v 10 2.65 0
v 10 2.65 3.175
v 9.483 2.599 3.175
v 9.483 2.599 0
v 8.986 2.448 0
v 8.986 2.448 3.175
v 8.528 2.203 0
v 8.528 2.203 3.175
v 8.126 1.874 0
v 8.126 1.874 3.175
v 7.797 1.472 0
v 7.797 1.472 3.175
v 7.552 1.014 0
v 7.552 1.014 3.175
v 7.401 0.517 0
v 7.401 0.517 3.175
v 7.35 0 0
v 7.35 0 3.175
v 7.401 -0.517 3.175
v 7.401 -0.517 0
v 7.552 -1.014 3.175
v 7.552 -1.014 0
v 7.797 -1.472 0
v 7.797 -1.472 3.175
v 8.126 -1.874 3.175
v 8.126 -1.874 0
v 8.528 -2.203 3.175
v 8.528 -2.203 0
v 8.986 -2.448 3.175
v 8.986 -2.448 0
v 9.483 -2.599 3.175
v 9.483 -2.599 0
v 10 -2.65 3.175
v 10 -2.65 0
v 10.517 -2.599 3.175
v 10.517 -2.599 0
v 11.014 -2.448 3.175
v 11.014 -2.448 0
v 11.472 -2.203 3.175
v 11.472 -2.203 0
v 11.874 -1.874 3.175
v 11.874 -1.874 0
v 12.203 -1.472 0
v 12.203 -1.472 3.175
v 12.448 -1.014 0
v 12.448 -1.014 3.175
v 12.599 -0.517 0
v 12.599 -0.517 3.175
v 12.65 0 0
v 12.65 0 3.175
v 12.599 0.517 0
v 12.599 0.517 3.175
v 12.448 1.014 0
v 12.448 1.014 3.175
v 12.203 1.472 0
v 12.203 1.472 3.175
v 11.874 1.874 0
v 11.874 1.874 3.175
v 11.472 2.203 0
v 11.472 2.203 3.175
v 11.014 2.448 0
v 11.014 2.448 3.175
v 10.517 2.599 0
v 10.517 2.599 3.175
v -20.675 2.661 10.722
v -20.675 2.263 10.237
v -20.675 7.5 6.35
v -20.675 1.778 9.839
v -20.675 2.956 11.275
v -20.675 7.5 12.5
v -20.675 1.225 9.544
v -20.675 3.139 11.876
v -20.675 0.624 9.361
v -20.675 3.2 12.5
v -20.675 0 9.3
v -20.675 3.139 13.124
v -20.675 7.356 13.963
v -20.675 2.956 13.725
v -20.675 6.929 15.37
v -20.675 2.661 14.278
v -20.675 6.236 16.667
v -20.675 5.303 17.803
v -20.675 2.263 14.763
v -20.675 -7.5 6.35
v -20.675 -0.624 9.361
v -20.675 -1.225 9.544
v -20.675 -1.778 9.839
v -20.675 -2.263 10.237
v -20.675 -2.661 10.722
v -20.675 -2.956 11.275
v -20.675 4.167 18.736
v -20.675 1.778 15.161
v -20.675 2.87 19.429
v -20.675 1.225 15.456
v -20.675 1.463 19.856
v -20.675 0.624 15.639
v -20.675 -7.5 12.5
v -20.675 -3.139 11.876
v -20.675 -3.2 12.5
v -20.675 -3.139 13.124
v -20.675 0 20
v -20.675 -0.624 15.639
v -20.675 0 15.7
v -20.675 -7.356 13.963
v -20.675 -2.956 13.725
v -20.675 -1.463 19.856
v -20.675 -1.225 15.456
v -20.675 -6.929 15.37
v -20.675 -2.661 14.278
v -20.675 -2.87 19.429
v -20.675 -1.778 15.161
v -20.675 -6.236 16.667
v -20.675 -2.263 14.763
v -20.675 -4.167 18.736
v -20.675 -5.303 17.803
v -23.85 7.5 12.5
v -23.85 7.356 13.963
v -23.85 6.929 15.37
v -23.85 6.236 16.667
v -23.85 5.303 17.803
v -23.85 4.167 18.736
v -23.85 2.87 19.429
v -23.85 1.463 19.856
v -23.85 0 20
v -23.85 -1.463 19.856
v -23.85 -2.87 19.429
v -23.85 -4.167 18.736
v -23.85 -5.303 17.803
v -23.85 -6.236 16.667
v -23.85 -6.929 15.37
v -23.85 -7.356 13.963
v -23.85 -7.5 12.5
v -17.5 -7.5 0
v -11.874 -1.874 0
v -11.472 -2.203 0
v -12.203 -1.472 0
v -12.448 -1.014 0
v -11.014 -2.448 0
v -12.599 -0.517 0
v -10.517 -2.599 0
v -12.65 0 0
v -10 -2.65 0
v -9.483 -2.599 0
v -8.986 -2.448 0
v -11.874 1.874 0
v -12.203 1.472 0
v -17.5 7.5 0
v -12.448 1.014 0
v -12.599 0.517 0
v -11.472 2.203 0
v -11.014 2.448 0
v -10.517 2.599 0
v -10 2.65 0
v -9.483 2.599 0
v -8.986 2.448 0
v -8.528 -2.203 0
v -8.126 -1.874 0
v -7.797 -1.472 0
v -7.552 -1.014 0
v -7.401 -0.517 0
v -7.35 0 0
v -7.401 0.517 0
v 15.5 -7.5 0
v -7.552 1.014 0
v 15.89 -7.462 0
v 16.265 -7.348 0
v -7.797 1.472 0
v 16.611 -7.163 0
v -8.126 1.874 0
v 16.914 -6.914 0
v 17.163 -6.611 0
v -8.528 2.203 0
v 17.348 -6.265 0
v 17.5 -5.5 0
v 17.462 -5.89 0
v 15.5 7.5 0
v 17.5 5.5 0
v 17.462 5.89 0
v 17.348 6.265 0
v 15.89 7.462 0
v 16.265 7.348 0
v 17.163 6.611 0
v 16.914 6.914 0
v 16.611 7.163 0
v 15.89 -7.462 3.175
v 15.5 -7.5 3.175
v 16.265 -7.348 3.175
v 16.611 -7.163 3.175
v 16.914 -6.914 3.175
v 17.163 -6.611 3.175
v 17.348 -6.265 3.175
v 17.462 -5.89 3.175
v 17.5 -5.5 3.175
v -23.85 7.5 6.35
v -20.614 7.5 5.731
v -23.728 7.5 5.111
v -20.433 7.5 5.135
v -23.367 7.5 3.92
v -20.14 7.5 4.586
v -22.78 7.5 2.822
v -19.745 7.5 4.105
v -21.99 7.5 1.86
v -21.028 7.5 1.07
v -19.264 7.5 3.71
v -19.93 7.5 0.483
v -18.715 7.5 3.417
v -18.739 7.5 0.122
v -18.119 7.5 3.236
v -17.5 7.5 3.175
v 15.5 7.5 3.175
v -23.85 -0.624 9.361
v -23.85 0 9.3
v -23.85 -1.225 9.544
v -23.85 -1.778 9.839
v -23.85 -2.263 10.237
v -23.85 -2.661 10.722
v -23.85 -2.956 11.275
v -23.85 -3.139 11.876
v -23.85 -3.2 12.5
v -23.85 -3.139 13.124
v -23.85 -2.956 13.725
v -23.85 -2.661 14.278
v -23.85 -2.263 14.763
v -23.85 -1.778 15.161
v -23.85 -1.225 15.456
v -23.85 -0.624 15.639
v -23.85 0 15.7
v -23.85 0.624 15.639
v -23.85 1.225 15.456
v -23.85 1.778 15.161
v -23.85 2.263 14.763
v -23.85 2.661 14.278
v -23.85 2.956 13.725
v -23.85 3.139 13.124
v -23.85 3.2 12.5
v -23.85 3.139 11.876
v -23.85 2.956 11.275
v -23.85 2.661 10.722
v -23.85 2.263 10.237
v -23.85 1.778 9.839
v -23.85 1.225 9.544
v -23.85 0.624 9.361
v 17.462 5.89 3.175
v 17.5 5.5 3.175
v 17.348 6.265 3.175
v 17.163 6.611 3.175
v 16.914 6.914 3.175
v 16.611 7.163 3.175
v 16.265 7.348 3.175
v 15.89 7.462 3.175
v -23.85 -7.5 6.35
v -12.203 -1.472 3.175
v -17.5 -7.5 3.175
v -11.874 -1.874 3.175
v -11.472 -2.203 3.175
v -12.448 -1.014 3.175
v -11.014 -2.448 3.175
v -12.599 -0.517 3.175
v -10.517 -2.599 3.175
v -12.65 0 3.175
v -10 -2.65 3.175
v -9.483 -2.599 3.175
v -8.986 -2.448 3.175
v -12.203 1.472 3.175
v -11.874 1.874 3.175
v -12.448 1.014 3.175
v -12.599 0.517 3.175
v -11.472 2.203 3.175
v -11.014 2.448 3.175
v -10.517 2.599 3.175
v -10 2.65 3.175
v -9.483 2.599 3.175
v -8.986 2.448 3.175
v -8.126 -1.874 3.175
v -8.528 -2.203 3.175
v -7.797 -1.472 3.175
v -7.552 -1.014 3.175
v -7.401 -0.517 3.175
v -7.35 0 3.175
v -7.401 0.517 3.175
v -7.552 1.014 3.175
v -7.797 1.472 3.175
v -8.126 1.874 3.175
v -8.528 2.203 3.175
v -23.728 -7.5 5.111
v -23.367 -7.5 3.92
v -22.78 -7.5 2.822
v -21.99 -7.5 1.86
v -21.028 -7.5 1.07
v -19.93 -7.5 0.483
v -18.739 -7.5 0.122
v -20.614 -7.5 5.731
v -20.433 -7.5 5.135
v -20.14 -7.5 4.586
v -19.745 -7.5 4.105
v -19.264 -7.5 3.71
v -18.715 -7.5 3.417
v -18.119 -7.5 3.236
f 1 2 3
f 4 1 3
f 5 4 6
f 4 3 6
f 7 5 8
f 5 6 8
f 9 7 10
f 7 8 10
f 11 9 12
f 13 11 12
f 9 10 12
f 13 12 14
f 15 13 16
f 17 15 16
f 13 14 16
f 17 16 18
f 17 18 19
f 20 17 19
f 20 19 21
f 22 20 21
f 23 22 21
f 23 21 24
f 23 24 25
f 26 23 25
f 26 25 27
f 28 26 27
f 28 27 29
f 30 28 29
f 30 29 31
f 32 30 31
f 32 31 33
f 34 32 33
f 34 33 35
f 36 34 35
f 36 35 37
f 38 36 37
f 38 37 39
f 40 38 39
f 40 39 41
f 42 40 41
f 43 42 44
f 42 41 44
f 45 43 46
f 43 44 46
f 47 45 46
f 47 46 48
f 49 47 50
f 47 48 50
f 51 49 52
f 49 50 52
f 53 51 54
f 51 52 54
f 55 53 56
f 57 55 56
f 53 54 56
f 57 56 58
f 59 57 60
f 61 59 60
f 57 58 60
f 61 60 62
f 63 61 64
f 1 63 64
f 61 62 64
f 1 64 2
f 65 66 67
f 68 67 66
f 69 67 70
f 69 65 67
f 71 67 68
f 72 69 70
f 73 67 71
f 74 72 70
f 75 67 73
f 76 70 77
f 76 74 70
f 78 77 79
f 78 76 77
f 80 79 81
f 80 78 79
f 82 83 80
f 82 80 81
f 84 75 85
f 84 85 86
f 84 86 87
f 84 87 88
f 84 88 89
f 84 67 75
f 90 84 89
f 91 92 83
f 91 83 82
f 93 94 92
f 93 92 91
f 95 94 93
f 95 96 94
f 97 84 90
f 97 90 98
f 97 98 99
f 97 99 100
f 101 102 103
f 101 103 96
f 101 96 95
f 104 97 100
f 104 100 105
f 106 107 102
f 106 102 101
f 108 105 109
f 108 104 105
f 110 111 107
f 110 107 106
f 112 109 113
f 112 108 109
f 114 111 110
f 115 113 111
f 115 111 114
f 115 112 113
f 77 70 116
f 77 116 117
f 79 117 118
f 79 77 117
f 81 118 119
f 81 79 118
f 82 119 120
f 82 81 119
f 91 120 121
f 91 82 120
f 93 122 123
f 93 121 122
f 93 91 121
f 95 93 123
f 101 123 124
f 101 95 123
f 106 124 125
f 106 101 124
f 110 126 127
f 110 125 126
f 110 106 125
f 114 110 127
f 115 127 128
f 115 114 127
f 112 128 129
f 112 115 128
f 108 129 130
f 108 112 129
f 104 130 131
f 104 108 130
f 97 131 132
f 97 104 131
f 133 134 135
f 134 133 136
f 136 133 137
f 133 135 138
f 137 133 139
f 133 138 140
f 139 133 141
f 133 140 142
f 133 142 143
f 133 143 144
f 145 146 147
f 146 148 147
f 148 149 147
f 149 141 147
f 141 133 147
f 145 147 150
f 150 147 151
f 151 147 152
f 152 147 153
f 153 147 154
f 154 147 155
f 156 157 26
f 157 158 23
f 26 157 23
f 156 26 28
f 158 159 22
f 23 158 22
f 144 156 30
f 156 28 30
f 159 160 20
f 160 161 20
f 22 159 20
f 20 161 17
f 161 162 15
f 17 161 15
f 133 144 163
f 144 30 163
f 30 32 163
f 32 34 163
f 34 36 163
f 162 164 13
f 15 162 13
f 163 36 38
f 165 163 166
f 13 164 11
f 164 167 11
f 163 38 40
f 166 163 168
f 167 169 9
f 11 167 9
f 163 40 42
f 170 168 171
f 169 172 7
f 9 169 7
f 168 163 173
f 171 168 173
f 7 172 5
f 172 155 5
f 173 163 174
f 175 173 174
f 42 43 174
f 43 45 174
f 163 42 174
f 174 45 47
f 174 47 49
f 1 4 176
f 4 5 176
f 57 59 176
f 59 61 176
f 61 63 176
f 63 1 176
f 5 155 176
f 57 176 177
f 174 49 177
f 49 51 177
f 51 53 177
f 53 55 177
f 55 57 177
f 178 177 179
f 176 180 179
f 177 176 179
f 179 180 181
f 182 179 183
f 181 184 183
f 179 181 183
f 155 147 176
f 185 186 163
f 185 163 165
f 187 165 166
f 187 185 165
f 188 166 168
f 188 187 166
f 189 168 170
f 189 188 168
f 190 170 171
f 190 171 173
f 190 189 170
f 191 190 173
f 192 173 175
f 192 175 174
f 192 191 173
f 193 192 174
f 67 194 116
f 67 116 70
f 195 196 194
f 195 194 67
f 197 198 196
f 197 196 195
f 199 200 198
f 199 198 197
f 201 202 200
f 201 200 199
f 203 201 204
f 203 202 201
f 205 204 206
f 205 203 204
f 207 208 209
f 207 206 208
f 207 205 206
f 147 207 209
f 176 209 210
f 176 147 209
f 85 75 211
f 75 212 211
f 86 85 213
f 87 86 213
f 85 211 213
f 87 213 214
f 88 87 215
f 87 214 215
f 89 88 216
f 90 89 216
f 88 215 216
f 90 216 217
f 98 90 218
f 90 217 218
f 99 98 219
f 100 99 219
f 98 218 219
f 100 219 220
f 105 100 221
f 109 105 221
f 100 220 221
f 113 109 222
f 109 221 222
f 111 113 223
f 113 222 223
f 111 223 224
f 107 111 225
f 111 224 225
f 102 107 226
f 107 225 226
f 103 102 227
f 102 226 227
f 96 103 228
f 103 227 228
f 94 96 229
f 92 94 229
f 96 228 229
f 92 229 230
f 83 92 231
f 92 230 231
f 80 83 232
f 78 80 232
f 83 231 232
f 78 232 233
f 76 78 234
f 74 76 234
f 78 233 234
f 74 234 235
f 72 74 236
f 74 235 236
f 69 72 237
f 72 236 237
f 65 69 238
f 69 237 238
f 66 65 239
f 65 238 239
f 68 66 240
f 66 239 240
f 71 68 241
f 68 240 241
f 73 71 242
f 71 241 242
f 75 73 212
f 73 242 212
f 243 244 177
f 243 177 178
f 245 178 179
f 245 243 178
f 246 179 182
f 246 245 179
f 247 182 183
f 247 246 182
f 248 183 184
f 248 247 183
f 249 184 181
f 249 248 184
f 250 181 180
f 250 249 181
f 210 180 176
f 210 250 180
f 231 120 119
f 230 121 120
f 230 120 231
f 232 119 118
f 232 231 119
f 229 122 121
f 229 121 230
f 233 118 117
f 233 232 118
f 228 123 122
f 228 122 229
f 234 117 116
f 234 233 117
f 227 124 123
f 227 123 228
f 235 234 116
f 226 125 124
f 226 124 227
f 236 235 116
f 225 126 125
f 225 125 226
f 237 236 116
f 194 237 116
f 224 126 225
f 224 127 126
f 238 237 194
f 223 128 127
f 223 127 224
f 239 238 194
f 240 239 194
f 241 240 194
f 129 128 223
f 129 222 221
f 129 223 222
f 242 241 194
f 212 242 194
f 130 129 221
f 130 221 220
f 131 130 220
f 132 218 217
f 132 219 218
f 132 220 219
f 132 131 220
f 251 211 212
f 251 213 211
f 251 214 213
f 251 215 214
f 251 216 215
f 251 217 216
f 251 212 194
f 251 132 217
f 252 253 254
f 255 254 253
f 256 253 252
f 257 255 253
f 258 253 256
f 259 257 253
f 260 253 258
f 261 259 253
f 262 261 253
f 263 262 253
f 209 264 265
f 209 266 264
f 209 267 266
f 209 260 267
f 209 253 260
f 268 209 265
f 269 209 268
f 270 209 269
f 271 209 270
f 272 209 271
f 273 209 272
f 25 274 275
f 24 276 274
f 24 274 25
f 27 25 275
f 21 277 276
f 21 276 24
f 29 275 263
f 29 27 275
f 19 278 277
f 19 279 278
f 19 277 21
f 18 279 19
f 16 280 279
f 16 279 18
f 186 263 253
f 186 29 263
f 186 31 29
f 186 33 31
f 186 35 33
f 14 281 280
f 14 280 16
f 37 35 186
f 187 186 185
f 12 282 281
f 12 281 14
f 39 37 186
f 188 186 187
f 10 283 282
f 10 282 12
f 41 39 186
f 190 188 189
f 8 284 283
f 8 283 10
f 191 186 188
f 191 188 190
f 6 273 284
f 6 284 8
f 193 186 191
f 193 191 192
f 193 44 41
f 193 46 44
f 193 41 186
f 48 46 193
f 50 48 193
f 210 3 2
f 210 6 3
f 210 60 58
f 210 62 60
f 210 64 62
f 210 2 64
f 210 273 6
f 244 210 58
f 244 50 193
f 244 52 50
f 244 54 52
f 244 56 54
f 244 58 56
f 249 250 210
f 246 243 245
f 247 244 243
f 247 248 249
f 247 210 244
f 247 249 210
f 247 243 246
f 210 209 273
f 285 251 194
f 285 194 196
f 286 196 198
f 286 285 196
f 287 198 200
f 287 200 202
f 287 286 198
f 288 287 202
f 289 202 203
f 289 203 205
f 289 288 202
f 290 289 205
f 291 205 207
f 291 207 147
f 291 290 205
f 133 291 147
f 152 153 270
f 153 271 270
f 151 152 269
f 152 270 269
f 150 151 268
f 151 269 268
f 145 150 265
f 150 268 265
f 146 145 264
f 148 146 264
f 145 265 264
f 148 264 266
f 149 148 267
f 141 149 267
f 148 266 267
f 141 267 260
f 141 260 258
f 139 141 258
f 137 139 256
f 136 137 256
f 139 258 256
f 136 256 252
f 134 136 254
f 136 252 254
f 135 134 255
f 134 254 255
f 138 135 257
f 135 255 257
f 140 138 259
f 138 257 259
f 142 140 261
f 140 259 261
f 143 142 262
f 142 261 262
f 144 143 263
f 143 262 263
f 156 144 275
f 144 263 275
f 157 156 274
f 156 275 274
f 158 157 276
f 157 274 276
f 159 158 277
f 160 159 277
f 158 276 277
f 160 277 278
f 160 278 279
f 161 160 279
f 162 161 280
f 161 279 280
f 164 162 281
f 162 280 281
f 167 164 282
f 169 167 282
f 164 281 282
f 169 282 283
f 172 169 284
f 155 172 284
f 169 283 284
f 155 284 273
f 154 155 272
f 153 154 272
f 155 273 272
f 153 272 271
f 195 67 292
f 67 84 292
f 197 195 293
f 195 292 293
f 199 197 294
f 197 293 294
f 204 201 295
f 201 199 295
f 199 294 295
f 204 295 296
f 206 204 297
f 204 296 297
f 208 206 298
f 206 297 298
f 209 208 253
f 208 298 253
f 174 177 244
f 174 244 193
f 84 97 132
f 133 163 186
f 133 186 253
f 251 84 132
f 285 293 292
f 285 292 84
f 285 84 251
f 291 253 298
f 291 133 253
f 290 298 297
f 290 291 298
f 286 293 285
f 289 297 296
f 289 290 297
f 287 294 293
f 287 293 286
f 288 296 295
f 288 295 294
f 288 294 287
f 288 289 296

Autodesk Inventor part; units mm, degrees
ref_plane "YZ Plane" through (0, 0, 0) normal (1, 0, 0) x (0, 1, 0)
ref_plane "XZ Plane" through (0, 0, 0) normal (0, 1, 0) x (-1, 0, 0)
ref_plane "XY Plane" through (0, 0, 0) normal (0, 0, 1) x (1, 0, 0)
sketch "Sketch1" plane through (0, 0, 0) normal (0, 0, 1) x (1, 0, 0)
  line L0 (17.5, -7.5) -> (-17.5, -7.5)
  line L1 (-17.5, -7.5) -> (-17.5, 7.5)
  line L2 (-17.5, 7.5) -> (17.5, 7.5)
  line L3 (17.5, 7.5) -> (17.5, -7.5)
  line L4 (17.5, -7.5) -> (-17.5, 7.5) construction
  line L5 (-17.5, -7.5) -> (17.5, 7.5) construction
  line L6 (-10, 0) -> (10, 0) construction
  point P0 (0, 0)
  dimension "d0" = 35
  dimension "d1" = 15
  dimension "d2" = 20
  dimension "d3" = 7.5
extrude "Plate1" add sketch "Sketch1" along normal blind 3.175
sketch "Sketch2" plane through (-20.675, -7.5, 6.35) normal (-1, 0, 0) x (0, -1, 0)
  line L0 (-15, 0) -> (0, 0)
  line L1 (0, 0) -> (0, 13.65)
  line L2 (0, 13.65) -> (-15, 13.65)
  line L3 (-15, 13.65) -> (-15, 0)
edge flange "Flange1" height 20 angle 90 thickness 3.175 bend radius 3.175 thickness toward (-1, 0, 0) relief tear relief width 3.175 relief depth 1.5875 edges at (-17.5, 0, 3.175) wall of the first edge with corners at (-20.675, 7.5, 6.35) (-20.675, -7.5, 6.35) (-20.675, -7.5, 20) (-20.675, 7.5, 20)
bend "Bend1"
corner "Corner1"
hole "Hole1" at (-10, 0, 0) at (10, 0, 0) direction (0, 0, 1) diameter 5.3 end through all
sketch "Sketch3" plane through (-20.675, -7.5, 20) normal (1, 0, 0) x (0, 0, -1)
  line L0 (13.65, 0) -> (13.65, 15) projected
  line L1 (0, 15) -> (13.65, 15) projected
  line L2 (0, 15) -> (0, 0) projected
  line L3 (0, 0) -> (13.65, 0) projected
  circle A0 centre (7.5, 7.5) radius 7.5
  point P0 (20, 7.5)
  point P1 (0, 7.5)
  point P2 (7.5, 15)
  point P3 (7.5, 0)
hole "Hole2" at (-20.675, 0, 12.5) direction (-1, 0, 0) diameter 6.4 end through all
extrude "Extrusion1" cut sketch "Sketch3" against normal through all contours L3 L2 A0 | L2 L1 A0
fillet "Fillet1" radius 2 2 edges at (17.5, 7.5, 1.5875) (17.5, -7.5, 1.5875)
equation "\"d0\" = d2 + d1"
equation "\"d3\" = 0.5 * d1"
equation "\"d20\" = Thickness"
equation "\"d4\" = Thickness"
equation "\"d5\" = BendReliefWidth"
equation "\"d6\" = BendReliefDepth"
equation "\"d7\" = MinimumRemnant"
equation "\"d8\" = TransitionRadius"
equation "\"d11\" = BendRadius"
equation "\"d12\" = CornerReliefSize"
equation "\"d13\" = GapSize"
equation "\"d14\" = JacobiRadiusSize"
equation "\"BendReliefWidth\" = Thickness"
equation "\"BendReliefDepth\" = 0.5 * Thickness"
equation "\"CornerReliefSize\" = 4 * Thickness"
equation "\"MinimumRemnant\" = 2 * Thickness"
equation "\"TransitionRadius\" = BendRadius"
equation "\"JacobiRadiusSize\" = BendRadius"
equation "\"GapSize\" = Thickness"
equation "\"Thickness\" = 3.175"
equation "\"BendRadius\" = 3.175"
properties part number "Inductive Sensor Bracket" material "Aluminum 6061"
